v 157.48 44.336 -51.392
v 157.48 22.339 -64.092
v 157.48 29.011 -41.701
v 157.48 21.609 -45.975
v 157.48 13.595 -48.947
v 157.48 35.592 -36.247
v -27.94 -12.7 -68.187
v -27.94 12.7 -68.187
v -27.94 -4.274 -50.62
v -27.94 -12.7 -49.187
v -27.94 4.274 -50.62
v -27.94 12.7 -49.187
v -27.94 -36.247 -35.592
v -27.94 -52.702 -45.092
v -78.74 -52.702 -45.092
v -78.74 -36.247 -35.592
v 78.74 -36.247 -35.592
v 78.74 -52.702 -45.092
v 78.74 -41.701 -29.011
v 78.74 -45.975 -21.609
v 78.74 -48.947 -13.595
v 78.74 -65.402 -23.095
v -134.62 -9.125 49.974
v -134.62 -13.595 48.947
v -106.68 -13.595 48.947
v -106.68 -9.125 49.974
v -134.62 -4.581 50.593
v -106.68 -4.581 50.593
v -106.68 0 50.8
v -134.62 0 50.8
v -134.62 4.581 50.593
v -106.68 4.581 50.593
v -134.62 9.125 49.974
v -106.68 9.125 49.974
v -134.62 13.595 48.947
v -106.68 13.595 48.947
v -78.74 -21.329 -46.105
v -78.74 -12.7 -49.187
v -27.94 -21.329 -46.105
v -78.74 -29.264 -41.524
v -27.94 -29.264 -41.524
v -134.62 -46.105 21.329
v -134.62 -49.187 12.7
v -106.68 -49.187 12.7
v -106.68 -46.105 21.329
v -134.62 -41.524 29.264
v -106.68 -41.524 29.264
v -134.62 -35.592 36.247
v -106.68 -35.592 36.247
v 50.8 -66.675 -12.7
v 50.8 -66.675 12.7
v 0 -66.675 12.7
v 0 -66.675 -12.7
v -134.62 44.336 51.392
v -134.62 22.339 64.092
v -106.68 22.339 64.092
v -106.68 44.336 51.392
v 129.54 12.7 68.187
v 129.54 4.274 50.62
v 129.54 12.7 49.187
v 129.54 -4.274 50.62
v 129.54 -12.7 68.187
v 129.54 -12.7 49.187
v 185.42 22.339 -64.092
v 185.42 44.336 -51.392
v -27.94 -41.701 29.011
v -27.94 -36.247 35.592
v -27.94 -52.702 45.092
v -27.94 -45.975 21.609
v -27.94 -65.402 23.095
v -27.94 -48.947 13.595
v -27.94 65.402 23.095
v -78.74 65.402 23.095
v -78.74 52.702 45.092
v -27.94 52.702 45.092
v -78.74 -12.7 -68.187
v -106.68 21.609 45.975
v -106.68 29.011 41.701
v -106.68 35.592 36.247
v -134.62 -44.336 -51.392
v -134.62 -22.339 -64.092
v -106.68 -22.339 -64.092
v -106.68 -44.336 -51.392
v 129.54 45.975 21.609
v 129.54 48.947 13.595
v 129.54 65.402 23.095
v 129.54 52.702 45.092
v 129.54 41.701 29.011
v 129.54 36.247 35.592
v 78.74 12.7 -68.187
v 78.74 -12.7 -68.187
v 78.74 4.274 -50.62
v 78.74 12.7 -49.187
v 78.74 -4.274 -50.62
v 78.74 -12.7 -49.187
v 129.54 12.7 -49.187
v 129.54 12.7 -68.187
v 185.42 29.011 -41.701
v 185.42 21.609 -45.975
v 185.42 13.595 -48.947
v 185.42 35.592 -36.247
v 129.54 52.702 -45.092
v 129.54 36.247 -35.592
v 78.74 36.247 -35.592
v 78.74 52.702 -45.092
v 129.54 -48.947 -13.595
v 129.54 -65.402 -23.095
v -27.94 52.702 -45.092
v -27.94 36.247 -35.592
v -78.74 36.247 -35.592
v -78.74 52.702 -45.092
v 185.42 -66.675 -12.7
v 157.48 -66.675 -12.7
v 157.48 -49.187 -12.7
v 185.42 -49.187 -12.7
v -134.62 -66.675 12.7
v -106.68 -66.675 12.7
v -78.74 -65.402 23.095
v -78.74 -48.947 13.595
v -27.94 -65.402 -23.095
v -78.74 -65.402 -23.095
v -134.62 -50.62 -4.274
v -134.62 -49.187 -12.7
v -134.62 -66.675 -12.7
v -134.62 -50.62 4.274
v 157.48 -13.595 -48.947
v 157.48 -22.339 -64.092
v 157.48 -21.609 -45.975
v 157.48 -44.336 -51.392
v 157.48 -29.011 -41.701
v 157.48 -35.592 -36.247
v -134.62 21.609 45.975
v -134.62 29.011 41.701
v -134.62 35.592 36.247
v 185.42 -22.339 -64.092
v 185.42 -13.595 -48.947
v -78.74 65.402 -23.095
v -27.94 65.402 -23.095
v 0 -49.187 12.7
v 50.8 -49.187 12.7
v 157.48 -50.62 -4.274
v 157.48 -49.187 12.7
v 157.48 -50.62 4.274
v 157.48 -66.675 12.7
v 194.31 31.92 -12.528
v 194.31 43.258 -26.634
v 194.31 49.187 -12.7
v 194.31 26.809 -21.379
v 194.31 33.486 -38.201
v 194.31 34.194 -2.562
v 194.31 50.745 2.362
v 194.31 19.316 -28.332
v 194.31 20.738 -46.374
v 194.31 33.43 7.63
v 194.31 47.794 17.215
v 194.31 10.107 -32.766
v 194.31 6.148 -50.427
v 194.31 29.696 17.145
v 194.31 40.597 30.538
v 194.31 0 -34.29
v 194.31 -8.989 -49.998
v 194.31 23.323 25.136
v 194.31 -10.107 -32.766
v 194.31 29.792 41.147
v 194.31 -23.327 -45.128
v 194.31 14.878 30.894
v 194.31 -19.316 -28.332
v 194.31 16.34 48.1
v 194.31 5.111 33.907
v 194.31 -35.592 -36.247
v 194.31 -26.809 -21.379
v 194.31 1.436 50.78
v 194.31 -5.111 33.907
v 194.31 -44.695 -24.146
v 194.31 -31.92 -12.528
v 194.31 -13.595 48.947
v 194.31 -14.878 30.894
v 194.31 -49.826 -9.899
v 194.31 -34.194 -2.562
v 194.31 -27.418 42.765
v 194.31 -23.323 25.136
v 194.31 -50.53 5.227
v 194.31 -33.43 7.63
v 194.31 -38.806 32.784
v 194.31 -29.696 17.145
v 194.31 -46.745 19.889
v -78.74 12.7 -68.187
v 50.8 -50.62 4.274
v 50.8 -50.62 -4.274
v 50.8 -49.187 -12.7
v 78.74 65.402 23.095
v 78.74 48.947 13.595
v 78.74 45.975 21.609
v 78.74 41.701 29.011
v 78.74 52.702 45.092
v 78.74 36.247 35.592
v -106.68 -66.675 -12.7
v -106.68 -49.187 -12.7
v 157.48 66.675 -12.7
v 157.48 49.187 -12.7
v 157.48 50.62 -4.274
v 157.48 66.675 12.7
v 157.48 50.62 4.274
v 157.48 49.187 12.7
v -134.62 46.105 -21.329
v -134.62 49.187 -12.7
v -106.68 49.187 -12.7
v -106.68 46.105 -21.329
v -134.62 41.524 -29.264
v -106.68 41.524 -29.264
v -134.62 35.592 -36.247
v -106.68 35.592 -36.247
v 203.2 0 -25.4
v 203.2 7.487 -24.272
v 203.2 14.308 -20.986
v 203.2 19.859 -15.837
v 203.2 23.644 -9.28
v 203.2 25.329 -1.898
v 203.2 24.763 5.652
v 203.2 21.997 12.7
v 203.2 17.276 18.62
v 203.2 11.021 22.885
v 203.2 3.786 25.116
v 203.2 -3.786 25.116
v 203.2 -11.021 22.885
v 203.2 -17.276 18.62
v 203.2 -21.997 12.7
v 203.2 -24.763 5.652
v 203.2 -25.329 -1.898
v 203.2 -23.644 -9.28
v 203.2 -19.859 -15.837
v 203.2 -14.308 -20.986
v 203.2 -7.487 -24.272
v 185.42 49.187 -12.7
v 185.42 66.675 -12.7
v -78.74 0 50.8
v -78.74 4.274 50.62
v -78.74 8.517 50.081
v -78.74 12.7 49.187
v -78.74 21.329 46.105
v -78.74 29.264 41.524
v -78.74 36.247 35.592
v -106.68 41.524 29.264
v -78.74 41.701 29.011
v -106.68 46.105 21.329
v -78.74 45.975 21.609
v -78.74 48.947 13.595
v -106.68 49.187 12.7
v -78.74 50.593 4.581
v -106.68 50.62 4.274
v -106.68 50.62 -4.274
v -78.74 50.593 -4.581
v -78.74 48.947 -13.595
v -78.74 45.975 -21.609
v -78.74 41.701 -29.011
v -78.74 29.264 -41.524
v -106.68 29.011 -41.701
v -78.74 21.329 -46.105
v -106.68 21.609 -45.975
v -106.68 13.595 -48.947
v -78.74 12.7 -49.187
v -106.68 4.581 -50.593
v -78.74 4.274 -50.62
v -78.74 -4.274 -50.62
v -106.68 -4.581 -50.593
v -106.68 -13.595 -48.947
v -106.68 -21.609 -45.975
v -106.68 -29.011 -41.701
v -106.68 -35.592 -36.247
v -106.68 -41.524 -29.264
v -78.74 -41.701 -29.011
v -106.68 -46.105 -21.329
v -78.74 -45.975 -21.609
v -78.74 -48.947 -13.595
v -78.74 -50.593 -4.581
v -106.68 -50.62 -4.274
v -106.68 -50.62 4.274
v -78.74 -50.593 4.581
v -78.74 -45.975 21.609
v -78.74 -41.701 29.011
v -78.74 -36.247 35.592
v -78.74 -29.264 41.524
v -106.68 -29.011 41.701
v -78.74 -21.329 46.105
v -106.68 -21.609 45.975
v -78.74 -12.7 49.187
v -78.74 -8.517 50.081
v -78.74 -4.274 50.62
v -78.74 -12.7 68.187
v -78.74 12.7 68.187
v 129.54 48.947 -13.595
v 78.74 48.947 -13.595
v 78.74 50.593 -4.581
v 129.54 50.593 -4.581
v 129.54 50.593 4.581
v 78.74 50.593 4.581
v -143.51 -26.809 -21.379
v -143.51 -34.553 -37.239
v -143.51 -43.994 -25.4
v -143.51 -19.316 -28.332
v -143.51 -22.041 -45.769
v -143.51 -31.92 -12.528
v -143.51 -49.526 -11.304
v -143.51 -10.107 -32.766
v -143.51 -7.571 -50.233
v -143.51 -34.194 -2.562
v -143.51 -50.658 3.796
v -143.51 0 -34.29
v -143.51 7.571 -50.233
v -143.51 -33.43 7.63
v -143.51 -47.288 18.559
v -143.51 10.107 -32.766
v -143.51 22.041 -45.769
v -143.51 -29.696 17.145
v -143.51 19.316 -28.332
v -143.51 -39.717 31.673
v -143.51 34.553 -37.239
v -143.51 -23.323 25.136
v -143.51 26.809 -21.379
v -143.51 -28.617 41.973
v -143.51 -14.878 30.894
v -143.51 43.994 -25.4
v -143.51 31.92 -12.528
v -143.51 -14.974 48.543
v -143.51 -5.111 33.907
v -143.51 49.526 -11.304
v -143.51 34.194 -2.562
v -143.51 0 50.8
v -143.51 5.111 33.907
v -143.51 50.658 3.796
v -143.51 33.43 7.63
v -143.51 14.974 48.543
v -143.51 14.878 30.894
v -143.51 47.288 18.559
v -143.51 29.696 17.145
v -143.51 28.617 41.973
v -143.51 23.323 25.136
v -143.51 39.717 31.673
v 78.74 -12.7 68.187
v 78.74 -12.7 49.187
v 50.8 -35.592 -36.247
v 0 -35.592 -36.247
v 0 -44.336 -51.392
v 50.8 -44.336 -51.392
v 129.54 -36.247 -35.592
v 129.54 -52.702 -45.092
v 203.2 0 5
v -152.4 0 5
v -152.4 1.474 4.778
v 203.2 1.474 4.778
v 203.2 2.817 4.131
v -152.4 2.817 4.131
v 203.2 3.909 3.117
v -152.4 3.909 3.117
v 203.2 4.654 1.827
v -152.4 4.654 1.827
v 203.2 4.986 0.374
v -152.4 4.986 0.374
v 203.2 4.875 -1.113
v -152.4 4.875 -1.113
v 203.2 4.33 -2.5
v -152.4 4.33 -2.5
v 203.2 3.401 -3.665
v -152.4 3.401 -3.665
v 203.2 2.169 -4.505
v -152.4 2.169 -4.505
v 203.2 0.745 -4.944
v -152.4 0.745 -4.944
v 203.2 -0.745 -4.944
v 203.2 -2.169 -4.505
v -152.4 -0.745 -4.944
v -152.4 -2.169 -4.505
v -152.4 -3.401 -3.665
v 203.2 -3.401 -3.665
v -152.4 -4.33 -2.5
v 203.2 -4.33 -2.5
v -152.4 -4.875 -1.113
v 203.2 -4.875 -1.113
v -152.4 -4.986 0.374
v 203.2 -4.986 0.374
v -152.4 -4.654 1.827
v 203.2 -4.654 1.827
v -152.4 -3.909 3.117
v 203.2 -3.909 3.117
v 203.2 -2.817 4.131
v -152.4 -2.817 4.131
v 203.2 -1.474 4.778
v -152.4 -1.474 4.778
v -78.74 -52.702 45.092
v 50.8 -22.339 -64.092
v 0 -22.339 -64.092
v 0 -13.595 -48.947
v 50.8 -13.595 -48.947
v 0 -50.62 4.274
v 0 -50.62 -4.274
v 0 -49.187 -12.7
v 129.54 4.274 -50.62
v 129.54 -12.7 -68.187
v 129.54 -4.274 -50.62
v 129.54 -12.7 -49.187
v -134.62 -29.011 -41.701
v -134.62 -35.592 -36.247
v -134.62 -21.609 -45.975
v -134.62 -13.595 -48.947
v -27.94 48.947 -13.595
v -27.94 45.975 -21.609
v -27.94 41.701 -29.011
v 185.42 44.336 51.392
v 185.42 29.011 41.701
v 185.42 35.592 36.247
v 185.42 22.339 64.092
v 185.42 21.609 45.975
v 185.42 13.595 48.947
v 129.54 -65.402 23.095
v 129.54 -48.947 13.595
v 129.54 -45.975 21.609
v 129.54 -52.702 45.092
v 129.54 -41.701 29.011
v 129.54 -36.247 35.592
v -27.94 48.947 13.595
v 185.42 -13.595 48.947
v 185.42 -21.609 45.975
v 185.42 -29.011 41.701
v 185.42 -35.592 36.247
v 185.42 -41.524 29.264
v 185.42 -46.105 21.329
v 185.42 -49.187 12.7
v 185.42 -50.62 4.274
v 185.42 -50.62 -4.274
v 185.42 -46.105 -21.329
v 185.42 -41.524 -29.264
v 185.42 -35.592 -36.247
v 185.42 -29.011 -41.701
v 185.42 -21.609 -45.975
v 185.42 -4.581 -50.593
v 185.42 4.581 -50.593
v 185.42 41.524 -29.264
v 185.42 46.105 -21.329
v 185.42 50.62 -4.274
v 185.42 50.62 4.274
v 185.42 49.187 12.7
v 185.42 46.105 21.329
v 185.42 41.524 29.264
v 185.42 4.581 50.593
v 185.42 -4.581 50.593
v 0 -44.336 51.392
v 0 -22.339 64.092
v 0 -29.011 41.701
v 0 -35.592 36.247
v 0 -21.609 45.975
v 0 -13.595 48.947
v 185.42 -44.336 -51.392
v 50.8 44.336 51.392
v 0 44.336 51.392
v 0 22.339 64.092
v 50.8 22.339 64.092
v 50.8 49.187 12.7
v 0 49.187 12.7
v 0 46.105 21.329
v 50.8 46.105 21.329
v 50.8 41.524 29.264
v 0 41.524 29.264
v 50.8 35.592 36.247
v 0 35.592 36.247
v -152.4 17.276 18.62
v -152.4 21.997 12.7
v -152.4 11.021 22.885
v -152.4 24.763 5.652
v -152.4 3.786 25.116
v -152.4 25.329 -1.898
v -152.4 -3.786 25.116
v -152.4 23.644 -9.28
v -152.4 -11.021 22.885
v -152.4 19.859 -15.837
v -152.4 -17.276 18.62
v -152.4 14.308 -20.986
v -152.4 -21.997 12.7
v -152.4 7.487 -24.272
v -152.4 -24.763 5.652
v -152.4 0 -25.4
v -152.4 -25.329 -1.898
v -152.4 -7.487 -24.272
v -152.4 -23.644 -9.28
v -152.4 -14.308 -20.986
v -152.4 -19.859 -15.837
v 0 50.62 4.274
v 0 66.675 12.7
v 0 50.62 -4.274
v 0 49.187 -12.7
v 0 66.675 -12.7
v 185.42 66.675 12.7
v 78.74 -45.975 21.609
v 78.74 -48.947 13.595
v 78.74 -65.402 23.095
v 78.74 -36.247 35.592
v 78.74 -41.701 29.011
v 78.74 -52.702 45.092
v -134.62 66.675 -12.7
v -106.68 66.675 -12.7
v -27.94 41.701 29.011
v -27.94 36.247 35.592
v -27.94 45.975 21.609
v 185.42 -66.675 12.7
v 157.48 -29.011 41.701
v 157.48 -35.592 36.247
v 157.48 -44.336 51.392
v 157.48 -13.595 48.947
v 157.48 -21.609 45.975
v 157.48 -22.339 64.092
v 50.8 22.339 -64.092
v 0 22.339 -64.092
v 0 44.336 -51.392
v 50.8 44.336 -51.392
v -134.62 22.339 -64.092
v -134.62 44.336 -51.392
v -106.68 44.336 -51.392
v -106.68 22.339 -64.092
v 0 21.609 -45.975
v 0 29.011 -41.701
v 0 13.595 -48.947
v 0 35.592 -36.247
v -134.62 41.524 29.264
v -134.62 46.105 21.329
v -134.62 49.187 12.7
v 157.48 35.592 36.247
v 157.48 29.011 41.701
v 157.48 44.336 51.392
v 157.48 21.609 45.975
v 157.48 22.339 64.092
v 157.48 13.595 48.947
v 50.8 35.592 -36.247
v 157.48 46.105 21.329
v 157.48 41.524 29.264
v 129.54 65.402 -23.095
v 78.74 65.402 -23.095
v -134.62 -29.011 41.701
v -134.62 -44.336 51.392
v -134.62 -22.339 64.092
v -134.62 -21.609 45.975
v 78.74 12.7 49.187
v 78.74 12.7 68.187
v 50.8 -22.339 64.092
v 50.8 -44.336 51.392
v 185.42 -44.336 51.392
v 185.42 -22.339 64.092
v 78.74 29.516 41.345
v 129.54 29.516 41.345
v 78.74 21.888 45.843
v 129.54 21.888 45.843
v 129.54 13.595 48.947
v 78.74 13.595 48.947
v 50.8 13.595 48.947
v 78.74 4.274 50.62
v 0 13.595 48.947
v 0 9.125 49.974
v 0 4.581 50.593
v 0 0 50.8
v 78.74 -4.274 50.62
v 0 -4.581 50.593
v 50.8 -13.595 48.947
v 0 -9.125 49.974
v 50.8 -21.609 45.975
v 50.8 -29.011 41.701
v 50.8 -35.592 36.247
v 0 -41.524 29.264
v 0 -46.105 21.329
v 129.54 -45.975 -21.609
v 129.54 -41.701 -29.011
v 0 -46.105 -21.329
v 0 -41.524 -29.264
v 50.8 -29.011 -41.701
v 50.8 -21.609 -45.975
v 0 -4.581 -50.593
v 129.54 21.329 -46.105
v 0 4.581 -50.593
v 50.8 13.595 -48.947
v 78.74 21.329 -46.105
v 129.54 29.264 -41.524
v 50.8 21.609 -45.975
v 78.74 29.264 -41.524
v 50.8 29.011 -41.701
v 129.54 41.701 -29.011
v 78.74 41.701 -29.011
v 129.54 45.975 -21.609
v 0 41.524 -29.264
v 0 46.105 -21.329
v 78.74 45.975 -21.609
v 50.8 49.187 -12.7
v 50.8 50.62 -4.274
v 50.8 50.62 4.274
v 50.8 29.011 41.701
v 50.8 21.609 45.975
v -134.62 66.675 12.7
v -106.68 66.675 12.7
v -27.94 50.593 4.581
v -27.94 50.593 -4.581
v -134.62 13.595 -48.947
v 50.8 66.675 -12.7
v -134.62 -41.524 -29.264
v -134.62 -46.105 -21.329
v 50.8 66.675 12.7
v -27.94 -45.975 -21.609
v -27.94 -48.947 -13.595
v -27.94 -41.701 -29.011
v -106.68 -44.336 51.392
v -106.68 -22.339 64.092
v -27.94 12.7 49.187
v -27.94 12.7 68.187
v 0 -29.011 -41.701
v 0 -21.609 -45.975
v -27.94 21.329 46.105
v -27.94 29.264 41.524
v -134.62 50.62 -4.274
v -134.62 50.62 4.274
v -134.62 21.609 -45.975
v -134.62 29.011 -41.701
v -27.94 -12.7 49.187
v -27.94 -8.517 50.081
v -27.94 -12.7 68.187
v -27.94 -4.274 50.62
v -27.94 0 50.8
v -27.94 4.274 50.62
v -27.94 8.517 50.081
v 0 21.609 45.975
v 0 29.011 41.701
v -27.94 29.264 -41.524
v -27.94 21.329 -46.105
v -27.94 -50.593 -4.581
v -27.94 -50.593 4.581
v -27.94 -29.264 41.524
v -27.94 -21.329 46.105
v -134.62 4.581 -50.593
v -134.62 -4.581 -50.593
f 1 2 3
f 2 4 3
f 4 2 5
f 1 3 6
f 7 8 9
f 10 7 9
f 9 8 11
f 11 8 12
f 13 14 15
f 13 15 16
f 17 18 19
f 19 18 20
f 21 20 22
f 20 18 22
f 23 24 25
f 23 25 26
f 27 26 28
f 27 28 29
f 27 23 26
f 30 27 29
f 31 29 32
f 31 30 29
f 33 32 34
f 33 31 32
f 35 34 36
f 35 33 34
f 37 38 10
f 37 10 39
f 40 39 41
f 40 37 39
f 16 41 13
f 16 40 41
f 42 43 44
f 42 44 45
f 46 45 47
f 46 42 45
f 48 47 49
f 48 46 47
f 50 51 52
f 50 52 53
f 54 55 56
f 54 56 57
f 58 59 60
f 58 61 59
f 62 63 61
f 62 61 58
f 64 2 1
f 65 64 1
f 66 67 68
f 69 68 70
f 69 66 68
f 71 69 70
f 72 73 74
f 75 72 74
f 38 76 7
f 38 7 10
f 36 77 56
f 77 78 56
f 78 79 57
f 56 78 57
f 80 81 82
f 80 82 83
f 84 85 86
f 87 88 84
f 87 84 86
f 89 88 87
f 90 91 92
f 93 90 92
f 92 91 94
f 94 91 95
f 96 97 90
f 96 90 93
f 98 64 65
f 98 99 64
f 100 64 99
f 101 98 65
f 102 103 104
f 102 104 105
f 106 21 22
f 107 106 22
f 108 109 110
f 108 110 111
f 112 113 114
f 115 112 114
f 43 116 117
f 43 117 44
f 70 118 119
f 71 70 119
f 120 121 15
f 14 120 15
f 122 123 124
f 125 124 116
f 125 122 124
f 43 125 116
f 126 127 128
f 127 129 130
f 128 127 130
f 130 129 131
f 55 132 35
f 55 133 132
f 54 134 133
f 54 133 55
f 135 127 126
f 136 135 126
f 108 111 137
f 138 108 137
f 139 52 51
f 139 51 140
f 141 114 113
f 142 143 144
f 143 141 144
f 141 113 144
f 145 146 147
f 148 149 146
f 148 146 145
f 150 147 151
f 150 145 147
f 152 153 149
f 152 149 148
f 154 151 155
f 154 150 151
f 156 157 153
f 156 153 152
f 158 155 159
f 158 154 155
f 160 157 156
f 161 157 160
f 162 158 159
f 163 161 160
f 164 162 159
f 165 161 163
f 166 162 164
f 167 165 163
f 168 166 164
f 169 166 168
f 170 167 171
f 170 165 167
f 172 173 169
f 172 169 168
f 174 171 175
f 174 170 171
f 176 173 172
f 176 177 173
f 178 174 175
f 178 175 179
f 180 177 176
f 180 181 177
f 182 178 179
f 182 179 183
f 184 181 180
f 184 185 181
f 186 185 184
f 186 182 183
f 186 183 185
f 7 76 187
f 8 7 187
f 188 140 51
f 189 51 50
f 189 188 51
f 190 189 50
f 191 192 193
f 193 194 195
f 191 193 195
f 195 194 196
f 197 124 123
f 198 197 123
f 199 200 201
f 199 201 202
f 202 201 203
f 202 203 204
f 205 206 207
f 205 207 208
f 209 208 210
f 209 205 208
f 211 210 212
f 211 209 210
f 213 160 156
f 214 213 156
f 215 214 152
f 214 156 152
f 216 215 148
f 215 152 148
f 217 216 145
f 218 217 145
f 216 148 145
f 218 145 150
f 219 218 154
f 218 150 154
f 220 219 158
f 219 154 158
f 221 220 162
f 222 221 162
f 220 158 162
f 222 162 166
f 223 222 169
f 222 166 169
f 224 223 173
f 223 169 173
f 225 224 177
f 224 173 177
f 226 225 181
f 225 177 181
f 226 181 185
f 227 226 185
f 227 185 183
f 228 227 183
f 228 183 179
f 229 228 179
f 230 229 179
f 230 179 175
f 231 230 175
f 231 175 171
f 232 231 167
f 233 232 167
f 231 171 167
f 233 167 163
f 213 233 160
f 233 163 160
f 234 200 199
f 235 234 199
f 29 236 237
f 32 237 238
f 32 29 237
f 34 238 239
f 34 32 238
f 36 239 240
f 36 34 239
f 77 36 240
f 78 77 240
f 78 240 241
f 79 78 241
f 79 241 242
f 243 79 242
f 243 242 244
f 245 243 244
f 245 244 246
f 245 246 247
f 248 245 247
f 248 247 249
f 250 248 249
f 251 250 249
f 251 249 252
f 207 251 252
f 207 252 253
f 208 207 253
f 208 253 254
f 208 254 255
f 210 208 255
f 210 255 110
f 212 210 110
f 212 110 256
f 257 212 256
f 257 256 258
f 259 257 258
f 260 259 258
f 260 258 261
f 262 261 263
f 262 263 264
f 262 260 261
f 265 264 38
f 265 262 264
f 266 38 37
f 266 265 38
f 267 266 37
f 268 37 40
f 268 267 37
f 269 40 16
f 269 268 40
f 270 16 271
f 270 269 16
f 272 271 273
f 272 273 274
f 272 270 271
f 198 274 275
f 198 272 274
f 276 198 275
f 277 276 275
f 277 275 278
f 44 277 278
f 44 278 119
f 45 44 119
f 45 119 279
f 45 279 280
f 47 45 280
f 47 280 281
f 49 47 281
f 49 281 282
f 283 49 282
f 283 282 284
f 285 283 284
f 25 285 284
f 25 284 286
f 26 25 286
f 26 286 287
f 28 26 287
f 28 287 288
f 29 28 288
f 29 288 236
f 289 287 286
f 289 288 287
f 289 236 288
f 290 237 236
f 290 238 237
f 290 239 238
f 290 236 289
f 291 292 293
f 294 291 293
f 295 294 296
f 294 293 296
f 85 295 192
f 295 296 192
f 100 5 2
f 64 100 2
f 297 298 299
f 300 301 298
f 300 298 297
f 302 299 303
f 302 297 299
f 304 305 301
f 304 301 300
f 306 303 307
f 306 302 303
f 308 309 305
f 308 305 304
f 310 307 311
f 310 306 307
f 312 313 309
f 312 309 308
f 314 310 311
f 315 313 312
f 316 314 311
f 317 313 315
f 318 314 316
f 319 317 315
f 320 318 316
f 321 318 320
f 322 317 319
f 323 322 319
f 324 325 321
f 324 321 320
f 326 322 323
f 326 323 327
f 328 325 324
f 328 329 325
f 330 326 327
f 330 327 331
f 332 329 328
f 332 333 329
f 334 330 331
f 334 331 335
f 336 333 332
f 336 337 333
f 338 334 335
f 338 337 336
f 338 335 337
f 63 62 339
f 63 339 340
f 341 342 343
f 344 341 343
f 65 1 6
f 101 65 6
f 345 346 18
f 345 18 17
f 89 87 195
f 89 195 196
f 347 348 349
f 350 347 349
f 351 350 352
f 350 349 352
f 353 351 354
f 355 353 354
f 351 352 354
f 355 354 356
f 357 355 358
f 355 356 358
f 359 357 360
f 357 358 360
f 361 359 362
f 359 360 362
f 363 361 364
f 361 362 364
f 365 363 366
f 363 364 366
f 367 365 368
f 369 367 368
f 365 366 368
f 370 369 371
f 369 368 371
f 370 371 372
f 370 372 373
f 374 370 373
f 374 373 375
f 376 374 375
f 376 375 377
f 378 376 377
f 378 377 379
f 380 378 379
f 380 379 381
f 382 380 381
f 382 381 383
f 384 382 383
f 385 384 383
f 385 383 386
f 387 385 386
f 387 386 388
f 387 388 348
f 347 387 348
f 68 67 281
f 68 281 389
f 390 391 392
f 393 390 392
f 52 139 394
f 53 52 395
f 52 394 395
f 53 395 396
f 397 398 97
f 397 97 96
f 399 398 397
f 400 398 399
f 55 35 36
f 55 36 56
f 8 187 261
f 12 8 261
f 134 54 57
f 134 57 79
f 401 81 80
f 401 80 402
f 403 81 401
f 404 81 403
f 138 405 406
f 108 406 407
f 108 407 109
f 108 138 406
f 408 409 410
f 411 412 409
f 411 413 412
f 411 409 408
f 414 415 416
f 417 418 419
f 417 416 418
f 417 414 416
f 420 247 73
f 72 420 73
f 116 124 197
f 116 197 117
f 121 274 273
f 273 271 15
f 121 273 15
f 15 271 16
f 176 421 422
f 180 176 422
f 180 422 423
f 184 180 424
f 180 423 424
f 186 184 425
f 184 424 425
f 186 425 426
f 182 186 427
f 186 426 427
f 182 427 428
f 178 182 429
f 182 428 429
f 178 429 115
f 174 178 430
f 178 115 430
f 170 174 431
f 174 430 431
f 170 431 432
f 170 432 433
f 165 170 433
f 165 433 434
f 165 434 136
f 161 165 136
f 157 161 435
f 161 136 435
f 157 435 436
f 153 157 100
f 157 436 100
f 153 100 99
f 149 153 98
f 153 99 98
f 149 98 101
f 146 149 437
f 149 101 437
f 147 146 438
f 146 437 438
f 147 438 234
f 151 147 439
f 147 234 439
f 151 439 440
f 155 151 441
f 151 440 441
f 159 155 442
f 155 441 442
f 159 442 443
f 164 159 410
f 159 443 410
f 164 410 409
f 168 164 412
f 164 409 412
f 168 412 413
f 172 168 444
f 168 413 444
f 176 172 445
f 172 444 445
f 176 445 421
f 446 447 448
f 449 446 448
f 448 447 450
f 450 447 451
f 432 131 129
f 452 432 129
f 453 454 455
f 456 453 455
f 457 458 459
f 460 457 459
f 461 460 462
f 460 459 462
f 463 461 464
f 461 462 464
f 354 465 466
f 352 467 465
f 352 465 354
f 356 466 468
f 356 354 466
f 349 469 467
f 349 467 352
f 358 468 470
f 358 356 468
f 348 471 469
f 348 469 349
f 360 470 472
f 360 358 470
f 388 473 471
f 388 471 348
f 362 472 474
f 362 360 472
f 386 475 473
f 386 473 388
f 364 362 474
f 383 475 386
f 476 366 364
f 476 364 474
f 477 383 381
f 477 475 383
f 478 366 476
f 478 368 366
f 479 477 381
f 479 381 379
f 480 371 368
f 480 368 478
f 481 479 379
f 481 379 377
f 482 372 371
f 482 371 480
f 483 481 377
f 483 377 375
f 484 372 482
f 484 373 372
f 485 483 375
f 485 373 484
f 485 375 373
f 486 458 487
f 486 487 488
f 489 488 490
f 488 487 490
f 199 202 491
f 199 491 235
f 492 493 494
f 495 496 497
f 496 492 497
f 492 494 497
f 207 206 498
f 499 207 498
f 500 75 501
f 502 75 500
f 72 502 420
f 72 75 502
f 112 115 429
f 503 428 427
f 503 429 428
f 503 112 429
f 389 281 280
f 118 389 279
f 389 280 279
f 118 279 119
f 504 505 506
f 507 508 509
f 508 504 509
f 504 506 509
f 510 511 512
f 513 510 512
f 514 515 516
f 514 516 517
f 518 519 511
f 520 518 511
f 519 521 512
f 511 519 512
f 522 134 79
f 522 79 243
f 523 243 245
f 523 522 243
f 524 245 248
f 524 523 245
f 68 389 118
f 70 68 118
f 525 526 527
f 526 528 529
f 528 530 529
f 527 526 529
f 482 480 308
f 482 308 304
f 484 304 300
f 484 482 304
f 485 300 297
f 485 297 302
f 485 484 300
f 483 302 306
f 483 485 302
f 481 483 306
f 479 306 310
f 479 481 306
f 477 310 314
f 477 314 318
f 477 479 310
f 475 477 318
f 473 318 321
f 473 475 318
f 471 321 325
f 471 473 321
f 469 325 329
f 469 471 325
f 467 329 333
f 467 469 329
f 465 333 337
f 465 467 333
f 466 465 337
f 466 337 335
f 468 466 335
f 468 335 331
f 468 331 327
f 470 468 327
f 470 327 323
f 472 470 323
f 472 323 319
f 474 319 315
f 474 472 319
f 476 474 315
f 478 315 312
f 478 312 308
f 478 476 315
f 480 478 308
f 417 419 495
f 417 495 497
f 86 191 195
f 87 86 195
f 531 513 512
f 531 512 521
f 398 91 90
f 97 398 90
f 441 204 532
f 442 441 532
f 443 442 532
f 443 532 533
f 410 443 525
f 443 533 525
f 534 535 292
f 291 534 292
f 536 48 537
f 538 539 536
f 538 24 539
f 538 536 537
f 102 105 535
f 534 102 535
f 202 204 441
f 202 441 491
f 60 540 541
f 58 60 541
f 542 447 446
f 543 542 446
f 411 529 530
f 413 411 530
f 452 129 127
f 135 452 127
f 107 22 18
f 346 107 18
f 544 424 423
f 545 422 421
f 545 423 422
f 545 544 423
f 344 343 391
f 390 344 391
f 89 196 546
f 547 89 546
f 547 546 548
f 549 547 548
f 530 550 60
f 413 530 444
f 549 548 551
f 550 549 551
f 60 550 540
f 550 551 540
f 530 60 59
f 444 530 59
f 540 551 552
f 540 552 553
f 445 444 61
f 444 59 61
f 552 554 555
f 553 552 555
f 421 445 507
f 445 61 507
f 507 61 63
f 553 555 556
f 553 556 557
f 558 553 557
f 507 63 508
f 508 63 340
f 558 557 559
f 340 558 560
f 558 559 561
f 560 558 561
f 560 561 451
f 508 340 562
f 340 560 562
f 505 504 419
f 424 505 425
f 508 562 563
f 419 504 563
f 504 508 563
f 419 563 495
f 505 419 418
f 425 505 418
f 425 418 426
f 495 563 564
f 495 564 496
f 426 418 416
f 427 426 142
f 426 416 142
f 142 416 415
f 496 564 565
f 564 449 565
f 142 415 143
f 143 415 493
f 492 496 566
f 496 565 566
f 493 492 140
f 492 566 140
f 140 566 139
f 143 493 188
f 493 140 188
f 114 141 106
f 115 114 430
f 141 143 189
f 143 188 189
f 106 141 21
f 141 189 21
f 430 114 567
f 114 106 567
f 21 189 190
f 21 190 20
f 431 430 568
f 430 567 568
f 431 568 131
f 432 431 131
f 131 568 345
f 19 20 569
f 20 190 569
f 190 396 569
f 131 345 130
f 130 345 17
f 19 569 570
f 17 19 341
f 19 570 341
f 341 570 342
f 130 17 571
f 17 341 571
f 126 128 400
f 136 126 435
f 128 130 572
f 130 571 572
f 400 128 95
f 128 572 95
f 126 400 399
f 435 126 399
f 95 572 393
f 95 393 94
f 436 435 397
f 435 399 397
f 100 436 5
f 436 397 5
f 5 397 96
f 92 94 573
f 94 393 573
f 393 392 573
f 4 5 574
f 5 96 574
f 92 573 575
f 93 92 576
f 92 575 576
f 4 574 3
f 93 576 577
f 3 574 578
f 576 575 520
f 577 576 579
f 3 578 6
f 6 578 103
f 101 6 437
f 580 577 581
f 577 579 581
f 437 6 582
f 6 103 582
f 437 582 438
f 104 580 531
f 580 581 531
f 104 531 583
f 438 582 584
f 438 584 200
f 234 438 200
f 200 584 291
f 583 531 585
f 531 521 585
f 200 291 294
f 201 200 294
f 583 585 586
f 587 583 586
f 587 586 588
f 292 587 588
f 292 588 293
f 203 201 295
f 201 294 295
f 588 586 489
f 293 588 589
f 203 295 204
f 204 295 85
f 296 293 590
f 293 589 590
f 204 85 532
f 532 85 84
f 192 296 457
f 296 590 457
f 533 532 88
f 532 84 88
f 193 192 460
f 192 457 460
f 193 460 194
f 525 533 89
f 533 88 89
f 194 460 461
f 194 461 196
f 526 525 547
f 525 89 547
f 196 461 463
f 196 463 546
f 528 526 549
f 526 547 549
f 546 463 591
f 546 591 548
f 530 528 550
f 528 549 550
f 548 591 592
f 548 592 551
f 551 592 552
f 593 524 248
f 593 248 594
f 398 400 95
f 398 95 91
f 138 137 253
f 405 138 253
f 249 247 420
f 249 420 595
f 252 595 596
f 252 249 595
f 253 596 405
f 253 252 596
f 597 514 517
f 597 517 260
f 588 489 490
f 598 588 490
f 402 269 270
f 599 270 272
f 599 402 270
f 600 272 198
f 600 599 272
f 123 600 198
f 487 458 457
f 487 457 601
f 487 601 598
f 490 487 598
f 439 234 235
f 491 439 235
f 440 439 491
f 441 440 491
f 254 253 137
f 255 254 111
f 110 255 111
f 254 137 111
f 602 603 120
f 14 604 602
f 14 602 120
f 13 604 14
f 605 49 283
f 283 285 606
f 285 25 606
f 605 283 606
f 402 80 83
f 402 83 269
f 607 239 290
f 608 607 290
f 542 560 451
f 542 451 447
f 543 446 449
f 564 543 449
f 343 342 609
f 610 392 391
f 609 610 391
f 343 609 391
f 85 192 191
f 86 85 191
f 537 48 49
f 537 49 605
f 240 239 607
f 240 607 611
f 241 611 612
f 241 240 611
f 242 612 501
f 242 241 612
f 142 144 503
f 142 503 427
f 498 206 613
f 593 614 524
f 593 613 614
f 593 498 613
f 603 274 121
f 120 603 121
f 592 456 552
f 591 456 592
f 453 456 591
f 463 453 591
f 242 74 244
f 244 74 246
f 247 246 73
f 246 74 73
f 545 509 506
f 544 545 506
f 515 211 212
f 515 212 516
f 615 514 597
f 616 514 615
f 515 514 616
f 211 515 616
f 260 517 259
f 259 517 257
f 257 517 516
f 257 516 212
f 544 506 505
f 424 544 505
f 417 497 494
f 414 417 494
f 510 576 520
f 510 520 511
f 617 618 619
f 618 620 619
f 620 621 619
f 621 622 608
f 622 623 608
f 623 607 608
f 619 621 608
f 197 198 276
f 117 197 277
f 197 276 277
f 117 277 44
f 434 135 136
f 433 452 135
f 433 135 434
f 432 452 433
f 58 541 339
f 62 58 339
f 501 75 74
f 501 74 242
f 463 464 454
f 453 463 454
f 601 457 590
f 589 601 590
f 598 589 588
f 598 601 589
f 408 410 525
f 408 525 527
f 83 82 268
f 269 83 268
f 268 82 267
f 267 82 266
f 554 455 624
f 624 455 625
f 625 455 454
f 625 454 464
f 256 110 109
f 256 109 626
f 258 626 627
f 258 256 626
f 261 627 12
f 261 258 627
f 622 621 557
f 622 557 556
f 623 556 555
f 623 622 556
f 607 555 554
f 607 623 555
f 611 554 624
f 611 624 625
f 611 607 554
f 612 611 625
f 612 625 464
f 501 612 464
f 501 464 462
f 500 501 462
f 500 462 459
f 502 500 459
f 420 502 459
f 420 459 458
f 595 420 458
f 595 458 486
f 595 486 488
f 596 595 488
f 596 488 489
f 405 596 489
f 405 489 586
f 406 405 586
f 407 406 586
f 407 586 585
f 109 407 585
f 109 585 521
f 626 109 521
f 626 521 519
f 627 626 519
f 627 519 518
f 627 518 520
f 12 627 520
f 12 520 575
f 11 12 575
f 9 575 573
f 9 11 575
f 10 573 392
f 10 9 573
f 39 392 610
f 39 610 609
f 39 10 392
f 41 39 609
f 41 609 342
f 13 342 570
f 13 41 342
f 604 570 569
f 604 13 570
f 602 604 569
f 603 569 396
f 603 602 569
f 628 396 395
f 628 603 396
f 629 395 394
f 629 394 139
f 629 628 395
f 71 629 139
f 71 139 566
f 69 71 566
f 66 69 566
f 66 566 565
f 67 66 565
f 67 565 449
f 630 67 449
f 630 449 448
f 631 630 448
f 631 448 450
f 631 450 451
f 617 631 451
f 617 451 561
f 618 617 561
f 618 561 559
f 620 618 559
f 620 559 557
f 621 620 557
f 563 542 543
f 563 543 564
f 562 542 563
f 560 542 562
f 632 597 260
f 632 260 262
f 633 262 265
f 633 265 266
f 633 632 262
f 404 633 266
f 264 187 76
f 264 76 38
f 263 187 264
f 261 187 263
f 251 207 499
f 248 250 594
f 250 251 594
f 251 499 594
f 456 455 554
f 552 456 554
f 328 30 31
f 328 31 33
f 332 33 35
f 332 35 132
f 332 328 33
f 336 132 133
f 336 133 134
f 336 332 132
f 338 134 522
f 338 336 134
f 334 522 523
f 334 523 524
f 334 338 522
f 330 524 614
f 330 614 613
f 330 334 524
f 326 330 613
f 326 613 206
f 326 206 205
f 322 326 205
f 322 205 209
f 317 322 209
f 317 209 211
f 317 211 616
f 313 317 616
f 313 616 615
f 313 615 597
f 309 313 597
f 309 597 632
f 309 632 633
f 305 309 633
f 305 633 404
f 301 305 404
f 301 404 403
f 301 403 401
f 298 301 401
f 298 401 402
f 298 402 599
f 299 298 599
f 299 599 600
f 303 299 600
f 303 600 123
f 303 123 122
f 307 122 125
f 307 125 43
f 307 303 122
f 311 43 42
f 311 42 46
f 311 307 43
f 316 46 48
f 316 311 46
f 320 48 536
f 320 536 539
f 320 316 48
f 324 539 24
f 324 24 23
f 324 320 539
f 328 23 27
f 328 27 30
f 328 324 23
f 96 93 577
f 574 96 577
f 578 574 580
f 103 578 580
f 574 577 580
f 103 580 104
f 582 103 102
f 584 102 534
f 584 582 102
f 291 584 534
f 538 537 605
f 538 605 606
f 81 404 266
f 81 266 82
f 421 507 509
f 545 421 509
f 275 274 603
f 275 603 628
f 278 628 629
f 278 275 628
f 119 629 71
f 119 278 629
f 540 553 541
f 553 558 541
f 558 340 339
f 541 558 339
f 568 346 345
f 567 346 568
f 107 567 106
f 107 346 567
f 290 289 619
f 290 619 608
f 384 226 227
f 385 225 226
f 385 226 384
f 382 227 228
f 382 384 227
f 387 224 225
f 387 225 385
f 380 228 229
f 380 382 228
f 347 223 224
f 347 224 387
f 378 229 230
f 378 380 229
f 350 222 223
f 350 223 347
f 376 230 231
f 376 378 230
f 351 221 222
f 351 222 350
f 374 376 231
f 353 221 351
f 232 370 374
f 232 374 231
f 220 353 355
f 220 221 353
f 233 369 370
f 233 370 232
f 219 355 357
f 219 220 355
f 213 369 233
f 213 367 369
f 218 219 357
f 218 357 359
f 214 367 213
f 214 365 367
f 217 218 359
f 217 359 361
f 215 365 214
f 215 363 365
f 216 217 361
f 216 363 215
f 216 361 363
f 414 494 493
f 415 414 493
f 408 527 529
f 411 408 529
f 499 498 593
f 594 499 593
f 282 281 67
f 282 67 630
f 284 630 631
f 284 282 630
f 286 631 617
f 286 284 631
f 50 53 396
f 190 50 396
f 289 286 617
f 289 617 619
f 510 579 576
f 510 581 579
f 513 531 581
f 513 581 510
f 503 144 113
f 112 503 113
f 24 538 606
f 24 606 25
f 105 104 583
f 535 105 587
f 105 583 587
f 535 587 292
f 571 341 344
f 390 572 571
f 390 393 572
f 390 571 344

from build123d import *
from build123d.topology import SkipClean

# Parameters (mm, degrees)
SKETCH1_R            = 50.8
SKETCH1_W            = 25.4
SKETCH1_H            = 31.75
BOSS_EXTRUDE3_DEPTH  = 50.8
SKETCH2_R            = 50.8
BOSS_EXTRUDE4_DEPTH  = 27.94
SKETCH3_R            = 50.8
BOSS_EXTRUDE5_DEPTH  = 50.8
SKETCH4_R            = 50.8
BOSS_EXTRUDE6_DEPTH  = 27.94
SKETCH5_R            = 50.8
SKETCH5_W            = 25.4
SKETCH5_H            = 31.75
BOSS_EXTRUDE7_DEPTH  = 27.94
BOSS_EXTRUDE8_START  = 27.94
SKETCH6_R            = 50.8
BOSS_EXTRUDE8_DEPTH  = 27.94
BOSS_EXTRUDE9_START  = 50.8
SKETCH7_R            = 50.8
SKETCH7_W            = 31.75
SKETCH7_H            = 25.4
BOSS_EXTRUDE9_DEPTH  = 50.8
BOSS_EXTRUDE10_START = 27.94
SKETCH8_R            = 50.8
BOSS_EXTRUDE10_DEPTH = 27.94
BOSS_EXTRUDE11_START = 27.94
SKETCH9_R            = 50.8
SKETCH9_W            = 25.4
SKETCH9_H            = 31.75
BOSS_EXTRUDE11_DEPTH = 27.94
SKETCH10_R           = 50.8
BOSS_EXTRUDE12_DEPTH = 8.89
BOSS_EXTRUDE13_START = 8.89
SKETCH11_R           = 50.8
BOSS_EXTRUDE13_DEPTH = 8.89
SKETCH12_R           = 25.4
BOSS_EXTRUDE14_DEPTH = 8.89
BOSS_EXTRUDE15_START = 8.89
SKETCH13_R           = 25.4
BOSS_EXTRUDE15_DEPTH = 8.89
SKETCH14_R           = 5
CUT_EXTRUDE1_DEPTH   = 369.166294367
CHAMFER3_SIZE        = 8.89


with BuildPart() as part:
    # Sketch1 → Boss-Extrude3 (new body)
    with BuildSketch(Plane(origin=(0, 0, 0), x_dir=(0, 0, -1), z_dir=(1, 0, 0))):
        Circle(SKETCH1_R)
        with Locations((0, 50.8)):
            Rectangle(SKETCH1_W, SKETCH1_H)
        Polygon((51.392243797, 44.336022628), (23.895937227, 28.461022628), (36.595937227, 6.463977372), (64.092243797, 22.338977372), align=None)
        Polygon((64.092243797, -22.338977372), (36.595937227, -6.463977372), (23.895937227, -28.461022628), (51.392243797, -44.336022628), align=None)
        with Locations((0, -50.8)):
            Rectangle(SKETCH1_W, SKETCH1_H)
        Polygon((-51.392243797, -44.336022628), (-23.895937227, -28.461022628), (-36.595937227, -6.463977372), (-64.092243797, -22.338977372), align=None)
        Polygon((-64.092243797, 22.338977372), (-36.595937227, 6.463977372), (-23.895937227, 28.461022628), (-51.392243797, 44.336022628), align=None)
    extrude(amount=BOSS_EXTRUDE3_DEPTH)

    # Sketch2 → Boss-Extrude4 (add)
    with BuildSketch(Plane(origin=(50.8, 0, 0), x_dir=(0, 0, -1), z_dir=(1, 0, 0))):
        with Locations(Location((0, 0, 0), (0, 0, 164.477512186))):
            Circle(SKETCH2_R)
    extrude(amount=BOSS_EXTRUDE4_DEPTH)

    # Sketch3 → Boss-Extrude5 (add)
    with BuildSketch(Plane(origin=(78.74, 0, 0), x_dir=(0, 0, -1), z_dir=(1, 0, 0))):
        with Locations(Location((0, 0, 0), (0, 0, 165.522487814))):
            Circle(SKETCH3_R)
        Polygon((36.437276545, 12.7), (36.437276545, 0), (36.437276545, -12.7), (68.187276545, -12.7), (68.187276545, 12.7), align=None)
        Polygon((18.218638272, 31.555607132), (29.2171609, 25.205607132), (45.0921609, 52.701913703), (23.095115644, 65.401913703), (7.220115644, 37.905607132), align=None)
        Polygon((29.2171609, -25.205607132), (18.218638272, -31.555607132), (7.220115644, -37.905607132), (23.095115644, -65.401913703), (45.0921609, -52.701913703), align=None)
        Polygon((-7.220115644, -37.905607132), (-18.218638272, -31.555607132), (-29.2171609, -25.205607132), (-45.0921609, -52.701913703), (-23.095115644, -65.401913703), align=None)
        Polygon((-36.437276545, -12.7), (-36.437276545, 0), (-36.437276545, 12.7), (-68.187276545, 12.7), (-68.187276545, -12.7), align=None)
        Polygon((-29.2171609, 25.205607132), (-18.218638272, 31.555607132), (-7.220115644, 37.905607132), (-23.095115644, 65.401913703), (-45.0921609, 52.701913703), align=None)
    extrude(amount=BOSS_EXTRUDE5_DEPTH)

    # Sketch4 → Boss-Extrude6 (add)
    with BuildSketch(Plane(origin=(129.54, 0, 0), x_dir=(0, 0, -1), z_dir=(1, 0, 0))):
        with Locations(Location((0, 0, 0), (0, 0, 164.477512186))):
            Circle(SKETCH4_R)
    extrude(amount=BOSS_EXTRUDE6_DEPTH)

    # Sketch5 → Boss-Extrude7 (add)
    with BuildSketch(Plane(origin=(157.48, 0, 0), x_dir=(0, 0, -1), z_dir=(1, 0, 0))):
        with Locations(Location((0, 0, 0), (0, 0, 164.477512186))):
            Circle(SKETCH5_R)
        with Locations((0, 50.8)):
            Rectangle(SKETCH5_W, SKETCH5_H)
        Polygon((51.392243797, 44.336022628), (23.895937227, 28.461022628), (36.595937227, 6.463977372), (64.092243797, 22.338977372), align=None)
        Polygon((64.092243797, -22.338977372), (36.595937227, -6.463977372), (23.895937227, -28.461022628), (51.392243797, -44.336022628), align=None)
        with Locations((0, -50.8)):
            Rectangle(SKETCH5_W, SKETCH5_H)
        Polygon((-51.392243797, -44.336022628), (-23.895937227, -28.461022628), (-36.595937227, -6.463977372), (-64.092243797, -22.338977372), align=None)
        Polygon((-64.092243797, 22.338977372), (-36.595937227, 6.463977372), (-23.895937227, 28.461022628), (-51.392243797, 44.336022628), align=None)
    extrude(amount=BOSS_EXTRUDE7_DEPTH)

    # Sketch6 → Boss-Extrude8 (add)
    with SkipClean():  # the faces are left unmerged after this step: merging them gives an invalid solid
        with BuildSketch(Plane.ZY.offset(BOSS_EXTRUDE8_START)):
            Circle(SKETCH6_R)
        extrude(amount=-BOSS_EXTRUDE8_DEPTH)

    # Sketch7 → Boss-Extrude9 (add)
    with SkipClean():  # the faces are left unmerged after this step: merging them gives an invalid solid
        with BuildSketch(Plane.ZY.offset(27.94).offset(BOSS_EXTRUDE9_START)):
            with Locations(Location((0, 0, 0), (0, 0, 345.522487814))):
                Circle(SKETCH7_R)
            Polygon((23.095115644, 65.401913703), (45.0921609, 52.701913703), (29.2171609, 25.205607132), (7.220115644, 37.905607132), align=None)
            with Locations((52.312276545, 0)):
                Rectangle(SKETCH7_W, SKETCH7_H)
            Polygon((29.2171609, -25.205607132), (45.0921609, -52.701913703), (23.095115644, -65.401913703), (7.220115644, -37.905607132), align=None)
            Polygon((-7.220115644, -37.905607132), (-23.095115644, -65.401913703), (-45.0921609, -52.701913703), (-29.2171609, -25.205607132), align=None)
            with Locations((-52.312276545, 0)):
                Rectangle(SKETCH7_W, SKETCH7_H)
            Polygon((-29.2171609, 25.205607132), (-45.0921609, 52.701913703), (-23.095115644, 65.401913703), (-7.220115644, 37.905607132), align=None)
        extrude(amount=-BOSS_EXTRUDE9_DEPTH)

    # Sketch8 → Boss-Extrude10 (add)
    with SkipClean():  # the faces are left unmerged after this step: merging them gives an invalid solid
        with BuildSketch(Plane.ZY.offset(78.74).offset(BOSS_EXTRUDE10_START)):
            Circle(SKETCH8_R)
        extrude(amount=-BOSS_EXTRUDE10_DEPTH)

    # Sketch9 → Boss-Extrude11 (add)
    with SkipClean():  # the faces are left unmerged after this step: merging them gives an invalid solid
        with BuildSketch(Plane.ZY.offset(106.68).offset(BOSS_EXTRUDE11_START)):
            with Locations(Location((0, 0, 0), (0, 0, 15.522487814))):
                Circle(SKETCH9_R)
            with Locations((0, 50.8)):
                Rectangle(SKETCH9_W, SKETCH9_H)
            Polygon((51.392243797, 44.336022628), (23.895937227, 28.461022628), (36.595937227, 6.463977372), (64.092243797, 22.338977372), align=None)
            Polygon((64.092243797, -22.338977372), (36.595937227, -6.463977372), (23.895937227, -28.461022628), (51.392243797, -44.336022628), align=None)
            with Locations((0, -50.8)):
                Rectangle(SKETCH9_W, SKETCH9_H)
            Polygon((-51.392243797, -44.336022628), (-23.895937227, -28.461022628), (-36.595937227, -6.463977372), (-64.092243797, -22.338977372), align=None)
            Polygon((-64.092243797, 22.338977372), (-36.595937227, 6.463977372), (-23.895937227, 28.461022628), (-51.392243797, 44.336022628), align=None)
        extrude(amount=-BOSS_EXTRUDE11_DEPTH)

    # Sketch10 → Boss-Extrude12 (add)
    with SkipClean():  # the faces are left unmerged after this step: merging them gives an invalid solid
        with BuildSketch(Plane(origin=(185.42, 0, 0), x_dir=(0, 0, -1), z_dir=(1, 0, 0))):
            with Locations(Location((0, 0, 0), (0, 0, 195.522487814))):
                Circle(SKETCH10_R)
        extrude(amount=BOSS_EXTRUDE12_DEPTH)

    # Sketch11 → Boss-Extrude13 (add)
    with SkipClean():  # the faces are left unmerged after this step: merging them gives an invalid solid
        with BuildSketch(Plane.ZY.offset(134.62).offset(BOSS_EXTRUDE13_START)):
            Circle(SKETCH11_R)
        extrude(amount=-BOSS_EXTRUDE13_DEPTH)

    # Sketch12 → Boss-Extrude14 (add)
    with SkipClean():  # the faces are left unmerged after this step: merging them gives an invalid solid
        with BuildSketch(Plane(origin=(194.31, 0, 0), x_dir=(0, 0, -1), z_dir=(1, 0, 0))):
            Circle(SKETCH12_R)
        extrude(amount=BOSS_EXTRUDE14_DEPTH)

    # Sketch13 → Boss-Extrude15 (add)
    with SkipClean():  # the faces are left unmerged after this step: merging them gives an invalid solid
        with BuildSketch(Plane.ZY.offset(143.51).offset(BOSS_EXTRUDE15_START)):
            with Locations(Location((0, 0, 0), (0, 0, 180))):
                Circle(SKETCH13_R)
        extrude(amount=-BOSS_EXTRUDE15_DEPTH)

    # Sketch14 → Cut-Extrude1 (cut, through all)
    with SkipClean():  # the faces are left unmerged after this step: merging them gives an invalid solid
        with BuildSketch(Plane.ZY.offset(152.4)):
            Circle(SKETCH14_R)
        extrude(amount=-CUT_EXTRUDE1_DEPTH, mode=Mode.SUBTRACT)

    # Chamfer3
    chamfer3_edges = [part.edges().sort_by_distance(p)[0] for p in [
        (194.31, 0, 25.4),
        (-143.51, 0, 25.4),
    ]]
    chamfer(chamfer3_edges, length=CHAMFER3_SIZE - 0.0001)  # a hair under: the kernel refuses the full size


solid = part.part
